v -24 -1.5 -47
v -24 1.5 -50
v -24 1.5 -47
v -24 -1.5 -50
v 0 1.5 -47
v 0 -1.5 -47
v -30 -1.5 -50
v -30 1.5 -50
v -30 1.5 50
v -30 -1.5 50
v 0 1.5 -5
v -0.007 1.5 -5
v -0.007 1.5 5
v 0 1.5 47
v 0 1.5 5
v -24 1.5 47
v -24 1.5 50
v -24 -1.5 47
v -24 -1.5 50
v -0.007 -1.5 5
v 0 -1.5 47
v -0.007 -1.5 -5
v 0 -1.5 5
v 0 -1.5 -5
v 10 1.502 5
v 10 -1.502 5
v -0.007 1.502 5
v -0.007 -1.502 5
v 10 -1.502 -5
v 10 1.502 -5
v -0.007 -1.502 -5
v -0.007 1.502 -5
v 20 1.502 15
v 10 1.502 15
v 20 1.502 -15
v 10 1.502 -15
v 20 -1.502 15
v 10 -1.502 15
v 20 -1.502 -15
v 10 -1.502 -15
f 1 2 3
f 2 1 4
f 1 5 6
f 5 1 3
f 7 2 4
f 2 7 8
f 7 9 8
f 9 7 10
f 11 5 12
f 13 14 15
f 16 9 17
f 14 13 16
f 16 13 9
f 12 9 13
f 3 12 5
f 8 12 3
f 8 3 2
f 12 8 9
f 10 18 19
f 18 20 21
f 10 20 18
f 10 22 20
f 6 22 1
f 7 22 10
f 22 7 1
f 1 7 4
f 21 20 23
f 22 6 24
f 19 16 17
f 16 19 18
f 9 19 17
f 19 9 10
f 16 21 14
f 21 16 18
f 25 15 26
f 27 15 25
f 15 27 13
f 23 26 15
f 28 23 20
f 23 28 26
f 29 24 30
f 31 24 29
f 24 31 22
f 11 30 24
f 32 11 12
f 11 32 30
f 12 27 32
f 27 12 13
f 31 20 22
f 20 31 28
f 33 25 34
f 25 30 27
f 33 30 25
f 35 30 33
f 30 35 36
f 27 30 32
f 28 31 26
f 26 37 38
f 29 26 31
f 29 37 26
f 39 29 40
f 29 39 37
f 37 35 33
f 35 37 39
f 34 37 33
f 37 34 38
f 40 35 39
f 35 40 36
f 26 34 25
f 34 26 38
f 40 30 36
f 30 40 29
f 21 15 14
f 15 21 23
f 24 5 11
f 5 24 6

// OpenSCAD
// file: wall-anchor.scad
/**
 * The anchor is the structure
 * on the back side of the box
 * which holds together the
 * two ends of the wall.
 */

include <measures.scad>;

module wall_anchor()
{
    // horizontal
    translate([
        anchor_length/2-nothing,
        0,
        0
        ])
    cube([
        anchor_length+nothing,
        material_z+nothing,
        anchor_width
        ], center=true);

    // vertical
    translate([
        +anchor_length-anchor_width/2,
        0,
        0
        ])
    cube([
        anchor_width,
        material_z+nothing,
        anchor_height
        ], center=true);
}

wall_anchor();
// file: wall-front.scad
include <measures.scad>;

module wall_noses(x)
{
    for (z=[
        -wall_z/2-nose_z/2,
        +wall_z/2+nose_z/2
        ])
    {
        translate([
            x,
            0,
            z
            ])
        cube([
            nose_x,
            material_z,
            nose_z
            ], center=true);
    }
}

module wall_noses_left()
{
    wall_noses(-rect_x/2+nose_x/2);
}

module wall_noses_right()
{
    wall_noses(+rect_x/2-nose_x/2);
}

module wall_front()
{
    // base material
    cube([
        rect_x,
        material_z,
        wall_z
        ], center=true);

    // noses to top and bottom
    wall_noses_left();
    wall_noses_right();
}

wall_front();
// file: measures.scad
/**
 * Pencil box configuration
 * All measures in millimeters
 */

// rendering parameters
$fn = 200;
nothing = 0.005;

// material to cut from
material_x = 350;
material_y = 180;
material_z = 3;

// total size of the box
box_x = 130;
box_y = 70;
box_z = 100;

// measures of the two half circles left and right
curvature_y = box_y;
curvature_x = curvature_y/2;

// measure of rectangle between half circles
rect_x = box_x - 2*curvature_x;
rect_y = box_y;

top_opening_inset = 5.7*material_z;

wall_z = box_z - 2*material_z;

// distance between wall and outer edge
wall_inset = material_z;

curve_radius = box_y/2 - wall_inset - material_z;
curve_length = curve_radius*PI;

// total wall length without anchor
wall_length = 2*rect_x + 2*curve_length;

// nose properties
nose_x = 2*material_z;
nose_z = material_z;

// anchor
anchor_width = 10;
anchor_height = 30;
anchor_length = 20;

// for preview
pillar_count = 20;
pillar_angle = 180 / (pillar_count-1);
pillar_width = 4;

part_spacing = 1;
// main file
include <measures.scad>;
use <wall-front.scad>;
use <wall-anchor.scad>;

module wall_back_male()
{
    // base material
    translate([
        -rect_x/4,
        0,
        0
        ])
    cube([
        rect_x/2,
        material_z,
        wall_z
        ], center=true);

    // noses to top and bottom
    wall_noses_left();

    // anchor
    wall_anchor(anchor_width);
}

wall_back_male();
